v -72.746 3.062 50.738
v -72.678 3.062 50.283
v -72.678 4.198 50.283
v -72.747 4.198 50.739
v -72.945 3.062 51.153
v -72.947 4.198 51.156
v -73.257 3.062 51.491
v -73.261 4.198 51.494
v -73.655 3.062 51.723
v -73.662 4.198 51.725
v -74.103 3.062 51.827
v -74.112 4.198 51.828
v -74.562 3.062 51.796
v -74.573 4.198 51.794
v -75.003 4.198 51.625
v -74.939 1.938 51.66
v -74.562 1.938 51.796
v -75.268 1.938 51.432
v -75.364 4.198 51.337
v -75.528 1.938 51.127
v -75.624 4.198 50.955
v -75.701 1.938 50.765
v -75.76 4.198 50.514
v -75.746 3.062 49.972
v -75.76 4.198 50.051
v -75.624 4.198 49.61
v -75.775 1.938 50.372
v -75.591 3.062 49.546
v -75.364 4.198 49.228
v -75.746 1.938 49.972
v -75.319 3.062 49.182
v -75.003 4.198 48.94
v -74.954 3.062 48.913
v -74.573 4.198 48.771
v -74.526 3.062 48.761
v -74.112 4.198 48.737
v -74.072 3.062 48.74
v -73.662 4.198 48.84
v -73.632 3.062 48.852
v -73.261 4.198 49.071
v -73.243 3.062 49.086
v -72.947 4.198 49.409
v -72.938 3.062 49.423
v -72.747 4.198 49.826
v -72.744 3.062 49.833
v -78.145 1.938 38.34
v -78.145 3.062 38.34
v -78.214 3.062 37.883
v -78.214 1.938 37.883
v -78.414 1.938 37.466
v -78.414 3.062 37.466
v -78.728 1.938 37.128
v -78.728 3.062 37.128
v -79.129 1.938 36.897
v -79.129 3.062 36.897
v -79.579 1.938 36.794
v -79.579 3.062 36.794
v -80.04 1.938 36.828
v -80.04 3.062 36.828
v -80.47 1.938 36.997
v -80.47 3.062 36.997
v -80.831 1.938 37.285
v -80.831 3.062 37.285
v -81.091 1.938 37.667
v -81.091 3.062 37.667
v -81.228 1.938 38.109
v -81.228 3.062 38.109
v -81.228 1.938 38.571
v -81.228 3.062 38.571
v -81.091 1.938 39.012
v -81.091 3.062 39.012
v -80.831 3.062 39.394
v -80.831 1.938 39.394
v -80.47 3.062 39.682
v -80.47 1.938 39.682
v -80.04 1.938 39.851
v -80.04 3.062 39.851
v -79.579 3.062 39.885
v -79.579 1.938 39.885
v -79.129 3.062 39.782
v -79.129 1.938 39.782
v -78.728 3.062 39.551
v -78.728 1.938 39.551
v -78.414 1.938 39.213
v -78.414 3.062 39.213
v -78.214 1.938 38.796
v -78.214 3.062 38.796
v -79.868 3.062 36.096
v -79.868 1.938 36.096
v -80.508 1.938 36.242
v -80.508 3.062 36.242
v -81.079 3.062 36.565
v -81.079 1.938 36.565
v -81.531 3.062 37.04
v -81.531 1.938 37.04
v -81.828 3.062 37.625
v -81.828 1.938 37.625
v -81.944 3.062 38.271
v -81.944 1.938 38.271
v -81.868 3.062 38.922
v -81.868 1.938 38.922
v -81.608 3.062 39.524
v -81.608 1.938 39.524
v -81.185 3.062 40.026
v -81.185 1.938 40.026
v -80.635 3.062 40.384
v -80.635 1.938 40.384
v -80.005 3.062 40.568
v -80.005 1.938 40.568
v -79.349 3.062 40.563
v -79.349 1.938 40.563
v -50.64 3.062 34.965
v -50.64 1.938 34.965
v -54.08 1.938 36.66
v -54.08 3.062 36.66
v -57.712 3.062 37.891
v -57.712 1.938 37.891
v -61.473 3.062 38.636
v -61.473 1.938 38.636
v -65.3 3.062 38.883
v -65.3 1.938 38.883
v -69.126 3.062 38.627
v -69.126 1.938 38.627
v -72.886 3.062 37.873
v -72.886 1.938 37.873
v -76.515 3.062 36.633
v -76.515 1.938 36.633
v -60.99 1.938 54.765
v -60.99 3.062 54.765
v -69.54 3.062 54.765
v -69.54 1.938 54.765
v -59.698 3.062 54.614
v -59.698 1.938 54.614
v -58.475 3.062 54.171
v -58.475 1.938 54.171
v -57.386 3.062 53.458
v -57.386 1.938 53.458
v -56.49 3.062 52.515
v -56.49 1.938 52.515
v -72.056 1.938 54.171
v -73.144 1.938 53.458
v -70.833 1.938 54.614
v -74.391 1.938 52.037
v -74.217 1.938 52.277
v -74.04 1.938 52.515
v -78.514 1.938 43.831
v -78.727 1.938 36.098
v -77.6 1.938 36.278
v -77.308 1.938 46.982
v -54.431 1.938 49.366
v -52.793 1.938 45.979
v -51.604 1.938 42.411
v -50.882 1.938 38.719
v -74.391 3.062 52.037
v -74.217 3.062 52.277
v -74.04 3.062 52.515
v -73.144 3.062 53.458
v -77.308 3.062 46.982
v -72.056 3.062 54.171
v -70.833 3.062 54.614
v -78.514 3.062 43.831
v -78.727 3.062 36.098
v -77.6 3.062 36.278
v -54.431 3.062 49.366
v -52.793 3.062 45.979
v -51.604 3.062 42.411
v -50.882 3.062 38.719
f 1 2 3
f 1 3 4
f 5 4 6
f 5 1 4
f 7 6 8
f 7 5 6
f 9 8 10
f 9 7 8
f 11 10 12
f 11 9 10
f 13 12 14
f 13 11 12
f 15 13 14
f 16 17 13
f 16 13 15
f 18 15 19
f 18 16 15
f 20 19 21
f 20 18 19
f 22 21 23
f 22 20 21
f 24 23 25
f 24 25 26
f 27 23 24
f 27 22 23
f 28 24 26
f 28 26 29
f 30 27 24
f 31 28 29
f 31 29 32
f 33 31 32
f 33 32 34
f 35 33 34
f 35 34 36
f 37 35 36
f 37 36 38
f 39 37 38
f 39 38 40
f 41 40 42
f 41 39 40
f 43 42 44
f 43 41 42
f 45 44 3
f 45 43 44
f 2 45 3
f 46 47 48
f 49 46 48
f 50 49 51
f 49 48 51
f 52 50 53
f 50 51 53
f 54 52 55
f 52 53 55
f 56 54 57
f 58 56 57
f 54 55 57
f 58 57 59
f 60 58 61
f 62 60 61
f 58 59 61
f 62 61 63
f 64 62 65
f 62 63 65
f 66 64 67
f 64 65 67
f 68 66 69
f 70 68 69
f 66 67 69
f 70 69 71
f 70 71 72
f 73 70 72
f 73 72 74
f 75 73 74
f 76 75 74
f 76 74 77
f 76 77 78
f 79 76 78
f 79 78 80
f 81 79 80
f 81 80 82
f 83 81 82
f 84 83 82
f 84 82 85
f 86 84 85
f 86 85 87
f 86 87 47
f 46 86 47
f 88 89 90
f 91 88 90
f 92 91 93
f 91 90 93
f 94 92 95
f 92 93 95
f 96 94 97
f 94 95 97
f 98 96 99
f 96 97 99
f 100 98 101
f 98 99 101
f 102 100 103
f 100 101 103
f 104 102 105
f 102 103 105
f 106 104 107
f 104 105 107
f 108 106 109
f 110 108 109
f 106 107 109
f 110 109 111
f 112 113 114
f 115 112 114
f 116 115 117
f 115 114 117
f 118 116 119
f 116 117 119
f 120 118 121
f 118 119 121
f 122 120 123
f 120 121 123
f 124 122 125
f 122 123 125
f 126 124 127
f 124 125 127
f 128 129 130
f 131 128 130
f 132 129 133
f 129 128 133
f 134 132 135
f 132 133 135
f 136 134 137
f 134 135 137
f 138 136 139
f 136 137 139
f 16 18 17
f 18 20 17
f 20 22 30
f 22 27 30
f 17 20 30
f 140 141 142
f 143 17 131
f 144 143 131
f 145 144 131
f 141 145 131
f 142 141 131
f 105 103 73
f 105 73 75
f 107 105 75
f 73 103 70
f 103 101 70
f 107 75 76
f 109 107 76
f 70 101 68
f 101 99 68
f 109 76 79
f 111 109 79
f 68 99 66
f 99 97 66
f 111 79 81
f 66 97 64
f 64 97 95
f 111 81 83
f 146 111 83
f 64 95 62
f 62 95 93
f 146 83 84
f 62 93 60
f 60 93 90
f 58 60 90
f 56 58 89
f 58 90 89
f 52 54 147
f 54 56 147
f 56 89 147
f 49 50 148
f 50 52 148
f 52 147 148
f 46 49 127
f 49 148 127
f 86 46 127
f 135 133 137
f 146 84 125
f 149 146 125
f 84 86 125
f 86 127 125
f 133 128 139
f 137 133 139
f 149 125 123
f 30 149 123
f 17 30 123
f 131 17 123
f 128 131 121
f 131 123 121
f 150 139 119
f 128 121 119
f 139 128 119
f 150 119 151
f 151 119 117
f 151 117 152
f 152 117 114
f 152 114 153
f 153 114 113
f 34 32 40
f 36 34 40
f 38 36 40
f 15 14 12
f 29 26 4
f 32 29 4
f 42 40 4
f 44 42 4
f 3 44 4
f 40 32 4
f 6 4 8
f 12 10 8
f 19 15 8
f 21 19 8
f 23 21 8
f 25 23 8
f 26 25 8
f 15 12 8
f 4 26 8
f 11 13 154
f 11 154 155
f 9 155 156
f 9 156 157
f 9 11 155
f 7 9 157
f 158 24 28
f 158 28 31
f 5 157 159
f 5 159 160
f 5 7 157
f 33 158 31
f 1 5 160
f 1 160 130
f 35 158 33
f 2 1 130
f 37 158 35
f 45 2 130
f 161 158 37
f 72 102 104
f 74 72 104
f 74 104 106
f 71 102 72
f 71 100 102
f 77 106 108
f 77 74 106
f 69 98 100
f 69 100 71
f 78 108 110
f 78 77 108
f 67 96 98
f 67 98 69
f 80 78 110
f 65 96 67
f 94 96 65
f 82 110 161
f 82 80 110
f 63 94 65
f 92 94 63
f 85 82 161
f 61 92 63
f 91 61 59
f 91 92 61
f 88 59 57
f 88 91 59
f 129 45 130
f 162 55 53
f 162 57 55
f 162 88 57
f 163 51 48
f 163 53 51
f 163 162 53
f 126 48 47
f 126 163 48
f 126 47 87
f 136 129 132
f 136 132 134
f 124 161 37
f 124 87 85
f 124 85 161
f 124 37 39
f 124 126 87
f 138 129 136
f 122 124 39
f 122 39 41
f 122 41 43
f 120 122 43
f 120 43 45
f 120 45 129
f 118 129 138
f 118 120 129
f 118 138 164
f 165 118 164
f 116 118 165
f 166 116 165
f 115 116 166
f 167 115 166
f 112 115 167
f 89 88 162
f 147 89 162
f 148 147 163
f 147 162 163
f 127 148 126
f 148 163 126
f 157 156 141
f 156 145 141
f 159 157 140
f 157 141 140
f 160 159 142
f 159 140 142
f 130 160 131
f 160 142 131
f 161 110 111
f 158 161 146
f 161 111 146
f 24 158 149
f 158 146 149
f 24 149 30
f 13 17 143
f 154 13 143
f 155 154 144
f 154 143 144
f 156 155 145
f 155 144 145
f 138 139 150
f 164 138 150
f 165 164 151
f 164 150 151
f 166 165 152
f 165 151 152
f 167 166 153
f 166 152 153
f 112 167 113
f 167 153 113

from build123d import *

# Parameters (mm, degrees)
BOSS_EXTRUDE1_DEPTH = 5
SKETCH2_R           = 4.5
CUT_EXTRUDE1_DEPTH  = 180.046458535
CUT_EXTRUDE2_START  = -25
CUT_EXTRUDE2_DEPTH  = 25
CUT_EXTRUDE3_START  = -25
CUT_EXTRUDE3_DEPTH  = 25
FILLET1_R           = 25
SCALE1_SCALE        = 0.225
CUT_EXTRUDE4_REACH  = 100.567
SKETCH5_R           = 1.55
SKETCH7_R           = 1.55
BOSS_EXTRUDE3_DEPTH = 2.26


with BuildPart() as part:
    # Sketch1 → Boss-Extrude1 (new body)
    with BuildSketch(Plane(origin=(0, 0, 0), x_dir=(1, 0, 0), z_dir=(0, 1, 0))):
        with BuildLine():
            ThreePointArc((-130, 0), (-129.975663124, -2.515351975), (-129.902661607, -5.029762169))
            ThreePointArc((-129.902661607, -5.029762169), (-139.064924602, -16.153846154), (-127.596676804, -24.881480435))
            ThreePointArc((-127.596676804, -24.881480435), (-105.812439614, -75.523027104), (-65, -112.583302492))
            ThreePointArc((-65, -112.583302492), (-17.416697508, -65), (0, 0))
            ThreePointArc((0, 0), (-65, -17.416697508), (-130, 0))
        make_face()
    extrude(amount=BOSS_EXTRUDE1_DEPTH)

    # Sketch2 → Cut-Extrude1 (cut, through all)
    with BuildSketch(Plane(origin=(0, 5, 0), x_dir=(1, 0, 0), z_dir=(0, 1, 0))):
        with Locations((-129.131715701, -15)):
            Circle(SKETCH2_R)
        with Locations((-104.833820993, -68.079879377)):
            Circle(SKETCH2_R)
    extrude(amount=-CUT_EXTRUDE1_DEPTH, mode=Mode.SUBTRACT)

    # Sketch3 → Cut-Extrude2 (cut)
    with BuildSketch(Plane(origin=(0, 5, 0), x_dir=(1, 0, 0), z_dir=(0, 1, 0)).offset(CUT_EXTRUDE2_START)):
        with BuildLine():
            Line((-34.313010289, -88), (-95.686989711, -88))
            ThreePointArc((-95.686989711, -88), (-81.278298801, -101.458553824), (-65, -112.583302492))
            ThreePointArc((-65, -112.583302492), (-48.721701199, -101.458553824), (-34.313010289, -88))
        make_face()
    extrude(amount=CUT_EXTRUDE2_DEPTH, mode=Mode.SUBTRACT)

    # Sketch4 → Cut-Extrude3 (cut)
    with BuildSketch(Plane(origin=(0, 5, 0), x_dir=(1, 0, 0), z_dir=(0, 1, 0)).offset(CUT_EXTRUDE3_START)):
        with BuildLine():
            ThreePointArc((-130, 0), (-129.975663124, -2.515351975), (-129.902661607, -5.029762169))
            ThreePointArc((-129.902661607, -5.029762169), (-122.310091762, -5.339865772), (-115.00045201, -7.416509169))
            ThreePointArc((-115.00045201, -7.416509169), (-122.619676697, -3.949838105), (-130, 0))
        make_face()
    extrude(amount=CUT_EXTRUDE3_DEPTH, mode=Mode.SUBTRACT)

    # Fillet1
    fillet1_edges = [part.edges().sort_by_distance(p)[0] for p in [
        (-34.313010289, 2.5, 88),
        (-95.686989711, 2.5, 88),
    ]]
    fillet(fillet1_edges, radius=FILLET1_R)


with BuildPart() as part_1:
    # Scale1: scaled about (-65.342168123, 2.5, 45.115535207)
    add(part.part.scale(SCALE1_SCALE).moved(Location((-50.640180295, 1.9375, 34.964539785))))

    # Sketch5 → Cut-Extrude4 (cut, up to next)
    with BuildSketch(Plane(origin=(0, 3.0625, 0), x_dir=(1, 0, 0), z_dir=(0, 1, 0)), mode=Mode.PRIVATE) as cut_extrude4_sk1:
        with Locations((-79.694816328, -38.339539786)):
            Circle(SKETCH5_R)
    cut_extrude4_tool1 = extrude(cut_extrude4_sk1.sketch, amount=-CUT_EXTRUDE4_REACH, mode=Mode.PRIVATE) & part_1.part
    add(cut_extrude4_tool1.solids().sort_by_distance((-79.694816, 3.0625, 38.33954))[0], mode=Mode.SUBTRACT)

    # Sketch7 → Boss-Extrude3 (add)
    with BuildSketch(Plane.XZ.offset(-1.9375)):
        with Locations((-74.227790019, 50.282512645)):
            Circle(SKETCH7_R)
    extrude(amount=-BOSS_EXTRUDE3_DEPTH)


solid = part_1.part
